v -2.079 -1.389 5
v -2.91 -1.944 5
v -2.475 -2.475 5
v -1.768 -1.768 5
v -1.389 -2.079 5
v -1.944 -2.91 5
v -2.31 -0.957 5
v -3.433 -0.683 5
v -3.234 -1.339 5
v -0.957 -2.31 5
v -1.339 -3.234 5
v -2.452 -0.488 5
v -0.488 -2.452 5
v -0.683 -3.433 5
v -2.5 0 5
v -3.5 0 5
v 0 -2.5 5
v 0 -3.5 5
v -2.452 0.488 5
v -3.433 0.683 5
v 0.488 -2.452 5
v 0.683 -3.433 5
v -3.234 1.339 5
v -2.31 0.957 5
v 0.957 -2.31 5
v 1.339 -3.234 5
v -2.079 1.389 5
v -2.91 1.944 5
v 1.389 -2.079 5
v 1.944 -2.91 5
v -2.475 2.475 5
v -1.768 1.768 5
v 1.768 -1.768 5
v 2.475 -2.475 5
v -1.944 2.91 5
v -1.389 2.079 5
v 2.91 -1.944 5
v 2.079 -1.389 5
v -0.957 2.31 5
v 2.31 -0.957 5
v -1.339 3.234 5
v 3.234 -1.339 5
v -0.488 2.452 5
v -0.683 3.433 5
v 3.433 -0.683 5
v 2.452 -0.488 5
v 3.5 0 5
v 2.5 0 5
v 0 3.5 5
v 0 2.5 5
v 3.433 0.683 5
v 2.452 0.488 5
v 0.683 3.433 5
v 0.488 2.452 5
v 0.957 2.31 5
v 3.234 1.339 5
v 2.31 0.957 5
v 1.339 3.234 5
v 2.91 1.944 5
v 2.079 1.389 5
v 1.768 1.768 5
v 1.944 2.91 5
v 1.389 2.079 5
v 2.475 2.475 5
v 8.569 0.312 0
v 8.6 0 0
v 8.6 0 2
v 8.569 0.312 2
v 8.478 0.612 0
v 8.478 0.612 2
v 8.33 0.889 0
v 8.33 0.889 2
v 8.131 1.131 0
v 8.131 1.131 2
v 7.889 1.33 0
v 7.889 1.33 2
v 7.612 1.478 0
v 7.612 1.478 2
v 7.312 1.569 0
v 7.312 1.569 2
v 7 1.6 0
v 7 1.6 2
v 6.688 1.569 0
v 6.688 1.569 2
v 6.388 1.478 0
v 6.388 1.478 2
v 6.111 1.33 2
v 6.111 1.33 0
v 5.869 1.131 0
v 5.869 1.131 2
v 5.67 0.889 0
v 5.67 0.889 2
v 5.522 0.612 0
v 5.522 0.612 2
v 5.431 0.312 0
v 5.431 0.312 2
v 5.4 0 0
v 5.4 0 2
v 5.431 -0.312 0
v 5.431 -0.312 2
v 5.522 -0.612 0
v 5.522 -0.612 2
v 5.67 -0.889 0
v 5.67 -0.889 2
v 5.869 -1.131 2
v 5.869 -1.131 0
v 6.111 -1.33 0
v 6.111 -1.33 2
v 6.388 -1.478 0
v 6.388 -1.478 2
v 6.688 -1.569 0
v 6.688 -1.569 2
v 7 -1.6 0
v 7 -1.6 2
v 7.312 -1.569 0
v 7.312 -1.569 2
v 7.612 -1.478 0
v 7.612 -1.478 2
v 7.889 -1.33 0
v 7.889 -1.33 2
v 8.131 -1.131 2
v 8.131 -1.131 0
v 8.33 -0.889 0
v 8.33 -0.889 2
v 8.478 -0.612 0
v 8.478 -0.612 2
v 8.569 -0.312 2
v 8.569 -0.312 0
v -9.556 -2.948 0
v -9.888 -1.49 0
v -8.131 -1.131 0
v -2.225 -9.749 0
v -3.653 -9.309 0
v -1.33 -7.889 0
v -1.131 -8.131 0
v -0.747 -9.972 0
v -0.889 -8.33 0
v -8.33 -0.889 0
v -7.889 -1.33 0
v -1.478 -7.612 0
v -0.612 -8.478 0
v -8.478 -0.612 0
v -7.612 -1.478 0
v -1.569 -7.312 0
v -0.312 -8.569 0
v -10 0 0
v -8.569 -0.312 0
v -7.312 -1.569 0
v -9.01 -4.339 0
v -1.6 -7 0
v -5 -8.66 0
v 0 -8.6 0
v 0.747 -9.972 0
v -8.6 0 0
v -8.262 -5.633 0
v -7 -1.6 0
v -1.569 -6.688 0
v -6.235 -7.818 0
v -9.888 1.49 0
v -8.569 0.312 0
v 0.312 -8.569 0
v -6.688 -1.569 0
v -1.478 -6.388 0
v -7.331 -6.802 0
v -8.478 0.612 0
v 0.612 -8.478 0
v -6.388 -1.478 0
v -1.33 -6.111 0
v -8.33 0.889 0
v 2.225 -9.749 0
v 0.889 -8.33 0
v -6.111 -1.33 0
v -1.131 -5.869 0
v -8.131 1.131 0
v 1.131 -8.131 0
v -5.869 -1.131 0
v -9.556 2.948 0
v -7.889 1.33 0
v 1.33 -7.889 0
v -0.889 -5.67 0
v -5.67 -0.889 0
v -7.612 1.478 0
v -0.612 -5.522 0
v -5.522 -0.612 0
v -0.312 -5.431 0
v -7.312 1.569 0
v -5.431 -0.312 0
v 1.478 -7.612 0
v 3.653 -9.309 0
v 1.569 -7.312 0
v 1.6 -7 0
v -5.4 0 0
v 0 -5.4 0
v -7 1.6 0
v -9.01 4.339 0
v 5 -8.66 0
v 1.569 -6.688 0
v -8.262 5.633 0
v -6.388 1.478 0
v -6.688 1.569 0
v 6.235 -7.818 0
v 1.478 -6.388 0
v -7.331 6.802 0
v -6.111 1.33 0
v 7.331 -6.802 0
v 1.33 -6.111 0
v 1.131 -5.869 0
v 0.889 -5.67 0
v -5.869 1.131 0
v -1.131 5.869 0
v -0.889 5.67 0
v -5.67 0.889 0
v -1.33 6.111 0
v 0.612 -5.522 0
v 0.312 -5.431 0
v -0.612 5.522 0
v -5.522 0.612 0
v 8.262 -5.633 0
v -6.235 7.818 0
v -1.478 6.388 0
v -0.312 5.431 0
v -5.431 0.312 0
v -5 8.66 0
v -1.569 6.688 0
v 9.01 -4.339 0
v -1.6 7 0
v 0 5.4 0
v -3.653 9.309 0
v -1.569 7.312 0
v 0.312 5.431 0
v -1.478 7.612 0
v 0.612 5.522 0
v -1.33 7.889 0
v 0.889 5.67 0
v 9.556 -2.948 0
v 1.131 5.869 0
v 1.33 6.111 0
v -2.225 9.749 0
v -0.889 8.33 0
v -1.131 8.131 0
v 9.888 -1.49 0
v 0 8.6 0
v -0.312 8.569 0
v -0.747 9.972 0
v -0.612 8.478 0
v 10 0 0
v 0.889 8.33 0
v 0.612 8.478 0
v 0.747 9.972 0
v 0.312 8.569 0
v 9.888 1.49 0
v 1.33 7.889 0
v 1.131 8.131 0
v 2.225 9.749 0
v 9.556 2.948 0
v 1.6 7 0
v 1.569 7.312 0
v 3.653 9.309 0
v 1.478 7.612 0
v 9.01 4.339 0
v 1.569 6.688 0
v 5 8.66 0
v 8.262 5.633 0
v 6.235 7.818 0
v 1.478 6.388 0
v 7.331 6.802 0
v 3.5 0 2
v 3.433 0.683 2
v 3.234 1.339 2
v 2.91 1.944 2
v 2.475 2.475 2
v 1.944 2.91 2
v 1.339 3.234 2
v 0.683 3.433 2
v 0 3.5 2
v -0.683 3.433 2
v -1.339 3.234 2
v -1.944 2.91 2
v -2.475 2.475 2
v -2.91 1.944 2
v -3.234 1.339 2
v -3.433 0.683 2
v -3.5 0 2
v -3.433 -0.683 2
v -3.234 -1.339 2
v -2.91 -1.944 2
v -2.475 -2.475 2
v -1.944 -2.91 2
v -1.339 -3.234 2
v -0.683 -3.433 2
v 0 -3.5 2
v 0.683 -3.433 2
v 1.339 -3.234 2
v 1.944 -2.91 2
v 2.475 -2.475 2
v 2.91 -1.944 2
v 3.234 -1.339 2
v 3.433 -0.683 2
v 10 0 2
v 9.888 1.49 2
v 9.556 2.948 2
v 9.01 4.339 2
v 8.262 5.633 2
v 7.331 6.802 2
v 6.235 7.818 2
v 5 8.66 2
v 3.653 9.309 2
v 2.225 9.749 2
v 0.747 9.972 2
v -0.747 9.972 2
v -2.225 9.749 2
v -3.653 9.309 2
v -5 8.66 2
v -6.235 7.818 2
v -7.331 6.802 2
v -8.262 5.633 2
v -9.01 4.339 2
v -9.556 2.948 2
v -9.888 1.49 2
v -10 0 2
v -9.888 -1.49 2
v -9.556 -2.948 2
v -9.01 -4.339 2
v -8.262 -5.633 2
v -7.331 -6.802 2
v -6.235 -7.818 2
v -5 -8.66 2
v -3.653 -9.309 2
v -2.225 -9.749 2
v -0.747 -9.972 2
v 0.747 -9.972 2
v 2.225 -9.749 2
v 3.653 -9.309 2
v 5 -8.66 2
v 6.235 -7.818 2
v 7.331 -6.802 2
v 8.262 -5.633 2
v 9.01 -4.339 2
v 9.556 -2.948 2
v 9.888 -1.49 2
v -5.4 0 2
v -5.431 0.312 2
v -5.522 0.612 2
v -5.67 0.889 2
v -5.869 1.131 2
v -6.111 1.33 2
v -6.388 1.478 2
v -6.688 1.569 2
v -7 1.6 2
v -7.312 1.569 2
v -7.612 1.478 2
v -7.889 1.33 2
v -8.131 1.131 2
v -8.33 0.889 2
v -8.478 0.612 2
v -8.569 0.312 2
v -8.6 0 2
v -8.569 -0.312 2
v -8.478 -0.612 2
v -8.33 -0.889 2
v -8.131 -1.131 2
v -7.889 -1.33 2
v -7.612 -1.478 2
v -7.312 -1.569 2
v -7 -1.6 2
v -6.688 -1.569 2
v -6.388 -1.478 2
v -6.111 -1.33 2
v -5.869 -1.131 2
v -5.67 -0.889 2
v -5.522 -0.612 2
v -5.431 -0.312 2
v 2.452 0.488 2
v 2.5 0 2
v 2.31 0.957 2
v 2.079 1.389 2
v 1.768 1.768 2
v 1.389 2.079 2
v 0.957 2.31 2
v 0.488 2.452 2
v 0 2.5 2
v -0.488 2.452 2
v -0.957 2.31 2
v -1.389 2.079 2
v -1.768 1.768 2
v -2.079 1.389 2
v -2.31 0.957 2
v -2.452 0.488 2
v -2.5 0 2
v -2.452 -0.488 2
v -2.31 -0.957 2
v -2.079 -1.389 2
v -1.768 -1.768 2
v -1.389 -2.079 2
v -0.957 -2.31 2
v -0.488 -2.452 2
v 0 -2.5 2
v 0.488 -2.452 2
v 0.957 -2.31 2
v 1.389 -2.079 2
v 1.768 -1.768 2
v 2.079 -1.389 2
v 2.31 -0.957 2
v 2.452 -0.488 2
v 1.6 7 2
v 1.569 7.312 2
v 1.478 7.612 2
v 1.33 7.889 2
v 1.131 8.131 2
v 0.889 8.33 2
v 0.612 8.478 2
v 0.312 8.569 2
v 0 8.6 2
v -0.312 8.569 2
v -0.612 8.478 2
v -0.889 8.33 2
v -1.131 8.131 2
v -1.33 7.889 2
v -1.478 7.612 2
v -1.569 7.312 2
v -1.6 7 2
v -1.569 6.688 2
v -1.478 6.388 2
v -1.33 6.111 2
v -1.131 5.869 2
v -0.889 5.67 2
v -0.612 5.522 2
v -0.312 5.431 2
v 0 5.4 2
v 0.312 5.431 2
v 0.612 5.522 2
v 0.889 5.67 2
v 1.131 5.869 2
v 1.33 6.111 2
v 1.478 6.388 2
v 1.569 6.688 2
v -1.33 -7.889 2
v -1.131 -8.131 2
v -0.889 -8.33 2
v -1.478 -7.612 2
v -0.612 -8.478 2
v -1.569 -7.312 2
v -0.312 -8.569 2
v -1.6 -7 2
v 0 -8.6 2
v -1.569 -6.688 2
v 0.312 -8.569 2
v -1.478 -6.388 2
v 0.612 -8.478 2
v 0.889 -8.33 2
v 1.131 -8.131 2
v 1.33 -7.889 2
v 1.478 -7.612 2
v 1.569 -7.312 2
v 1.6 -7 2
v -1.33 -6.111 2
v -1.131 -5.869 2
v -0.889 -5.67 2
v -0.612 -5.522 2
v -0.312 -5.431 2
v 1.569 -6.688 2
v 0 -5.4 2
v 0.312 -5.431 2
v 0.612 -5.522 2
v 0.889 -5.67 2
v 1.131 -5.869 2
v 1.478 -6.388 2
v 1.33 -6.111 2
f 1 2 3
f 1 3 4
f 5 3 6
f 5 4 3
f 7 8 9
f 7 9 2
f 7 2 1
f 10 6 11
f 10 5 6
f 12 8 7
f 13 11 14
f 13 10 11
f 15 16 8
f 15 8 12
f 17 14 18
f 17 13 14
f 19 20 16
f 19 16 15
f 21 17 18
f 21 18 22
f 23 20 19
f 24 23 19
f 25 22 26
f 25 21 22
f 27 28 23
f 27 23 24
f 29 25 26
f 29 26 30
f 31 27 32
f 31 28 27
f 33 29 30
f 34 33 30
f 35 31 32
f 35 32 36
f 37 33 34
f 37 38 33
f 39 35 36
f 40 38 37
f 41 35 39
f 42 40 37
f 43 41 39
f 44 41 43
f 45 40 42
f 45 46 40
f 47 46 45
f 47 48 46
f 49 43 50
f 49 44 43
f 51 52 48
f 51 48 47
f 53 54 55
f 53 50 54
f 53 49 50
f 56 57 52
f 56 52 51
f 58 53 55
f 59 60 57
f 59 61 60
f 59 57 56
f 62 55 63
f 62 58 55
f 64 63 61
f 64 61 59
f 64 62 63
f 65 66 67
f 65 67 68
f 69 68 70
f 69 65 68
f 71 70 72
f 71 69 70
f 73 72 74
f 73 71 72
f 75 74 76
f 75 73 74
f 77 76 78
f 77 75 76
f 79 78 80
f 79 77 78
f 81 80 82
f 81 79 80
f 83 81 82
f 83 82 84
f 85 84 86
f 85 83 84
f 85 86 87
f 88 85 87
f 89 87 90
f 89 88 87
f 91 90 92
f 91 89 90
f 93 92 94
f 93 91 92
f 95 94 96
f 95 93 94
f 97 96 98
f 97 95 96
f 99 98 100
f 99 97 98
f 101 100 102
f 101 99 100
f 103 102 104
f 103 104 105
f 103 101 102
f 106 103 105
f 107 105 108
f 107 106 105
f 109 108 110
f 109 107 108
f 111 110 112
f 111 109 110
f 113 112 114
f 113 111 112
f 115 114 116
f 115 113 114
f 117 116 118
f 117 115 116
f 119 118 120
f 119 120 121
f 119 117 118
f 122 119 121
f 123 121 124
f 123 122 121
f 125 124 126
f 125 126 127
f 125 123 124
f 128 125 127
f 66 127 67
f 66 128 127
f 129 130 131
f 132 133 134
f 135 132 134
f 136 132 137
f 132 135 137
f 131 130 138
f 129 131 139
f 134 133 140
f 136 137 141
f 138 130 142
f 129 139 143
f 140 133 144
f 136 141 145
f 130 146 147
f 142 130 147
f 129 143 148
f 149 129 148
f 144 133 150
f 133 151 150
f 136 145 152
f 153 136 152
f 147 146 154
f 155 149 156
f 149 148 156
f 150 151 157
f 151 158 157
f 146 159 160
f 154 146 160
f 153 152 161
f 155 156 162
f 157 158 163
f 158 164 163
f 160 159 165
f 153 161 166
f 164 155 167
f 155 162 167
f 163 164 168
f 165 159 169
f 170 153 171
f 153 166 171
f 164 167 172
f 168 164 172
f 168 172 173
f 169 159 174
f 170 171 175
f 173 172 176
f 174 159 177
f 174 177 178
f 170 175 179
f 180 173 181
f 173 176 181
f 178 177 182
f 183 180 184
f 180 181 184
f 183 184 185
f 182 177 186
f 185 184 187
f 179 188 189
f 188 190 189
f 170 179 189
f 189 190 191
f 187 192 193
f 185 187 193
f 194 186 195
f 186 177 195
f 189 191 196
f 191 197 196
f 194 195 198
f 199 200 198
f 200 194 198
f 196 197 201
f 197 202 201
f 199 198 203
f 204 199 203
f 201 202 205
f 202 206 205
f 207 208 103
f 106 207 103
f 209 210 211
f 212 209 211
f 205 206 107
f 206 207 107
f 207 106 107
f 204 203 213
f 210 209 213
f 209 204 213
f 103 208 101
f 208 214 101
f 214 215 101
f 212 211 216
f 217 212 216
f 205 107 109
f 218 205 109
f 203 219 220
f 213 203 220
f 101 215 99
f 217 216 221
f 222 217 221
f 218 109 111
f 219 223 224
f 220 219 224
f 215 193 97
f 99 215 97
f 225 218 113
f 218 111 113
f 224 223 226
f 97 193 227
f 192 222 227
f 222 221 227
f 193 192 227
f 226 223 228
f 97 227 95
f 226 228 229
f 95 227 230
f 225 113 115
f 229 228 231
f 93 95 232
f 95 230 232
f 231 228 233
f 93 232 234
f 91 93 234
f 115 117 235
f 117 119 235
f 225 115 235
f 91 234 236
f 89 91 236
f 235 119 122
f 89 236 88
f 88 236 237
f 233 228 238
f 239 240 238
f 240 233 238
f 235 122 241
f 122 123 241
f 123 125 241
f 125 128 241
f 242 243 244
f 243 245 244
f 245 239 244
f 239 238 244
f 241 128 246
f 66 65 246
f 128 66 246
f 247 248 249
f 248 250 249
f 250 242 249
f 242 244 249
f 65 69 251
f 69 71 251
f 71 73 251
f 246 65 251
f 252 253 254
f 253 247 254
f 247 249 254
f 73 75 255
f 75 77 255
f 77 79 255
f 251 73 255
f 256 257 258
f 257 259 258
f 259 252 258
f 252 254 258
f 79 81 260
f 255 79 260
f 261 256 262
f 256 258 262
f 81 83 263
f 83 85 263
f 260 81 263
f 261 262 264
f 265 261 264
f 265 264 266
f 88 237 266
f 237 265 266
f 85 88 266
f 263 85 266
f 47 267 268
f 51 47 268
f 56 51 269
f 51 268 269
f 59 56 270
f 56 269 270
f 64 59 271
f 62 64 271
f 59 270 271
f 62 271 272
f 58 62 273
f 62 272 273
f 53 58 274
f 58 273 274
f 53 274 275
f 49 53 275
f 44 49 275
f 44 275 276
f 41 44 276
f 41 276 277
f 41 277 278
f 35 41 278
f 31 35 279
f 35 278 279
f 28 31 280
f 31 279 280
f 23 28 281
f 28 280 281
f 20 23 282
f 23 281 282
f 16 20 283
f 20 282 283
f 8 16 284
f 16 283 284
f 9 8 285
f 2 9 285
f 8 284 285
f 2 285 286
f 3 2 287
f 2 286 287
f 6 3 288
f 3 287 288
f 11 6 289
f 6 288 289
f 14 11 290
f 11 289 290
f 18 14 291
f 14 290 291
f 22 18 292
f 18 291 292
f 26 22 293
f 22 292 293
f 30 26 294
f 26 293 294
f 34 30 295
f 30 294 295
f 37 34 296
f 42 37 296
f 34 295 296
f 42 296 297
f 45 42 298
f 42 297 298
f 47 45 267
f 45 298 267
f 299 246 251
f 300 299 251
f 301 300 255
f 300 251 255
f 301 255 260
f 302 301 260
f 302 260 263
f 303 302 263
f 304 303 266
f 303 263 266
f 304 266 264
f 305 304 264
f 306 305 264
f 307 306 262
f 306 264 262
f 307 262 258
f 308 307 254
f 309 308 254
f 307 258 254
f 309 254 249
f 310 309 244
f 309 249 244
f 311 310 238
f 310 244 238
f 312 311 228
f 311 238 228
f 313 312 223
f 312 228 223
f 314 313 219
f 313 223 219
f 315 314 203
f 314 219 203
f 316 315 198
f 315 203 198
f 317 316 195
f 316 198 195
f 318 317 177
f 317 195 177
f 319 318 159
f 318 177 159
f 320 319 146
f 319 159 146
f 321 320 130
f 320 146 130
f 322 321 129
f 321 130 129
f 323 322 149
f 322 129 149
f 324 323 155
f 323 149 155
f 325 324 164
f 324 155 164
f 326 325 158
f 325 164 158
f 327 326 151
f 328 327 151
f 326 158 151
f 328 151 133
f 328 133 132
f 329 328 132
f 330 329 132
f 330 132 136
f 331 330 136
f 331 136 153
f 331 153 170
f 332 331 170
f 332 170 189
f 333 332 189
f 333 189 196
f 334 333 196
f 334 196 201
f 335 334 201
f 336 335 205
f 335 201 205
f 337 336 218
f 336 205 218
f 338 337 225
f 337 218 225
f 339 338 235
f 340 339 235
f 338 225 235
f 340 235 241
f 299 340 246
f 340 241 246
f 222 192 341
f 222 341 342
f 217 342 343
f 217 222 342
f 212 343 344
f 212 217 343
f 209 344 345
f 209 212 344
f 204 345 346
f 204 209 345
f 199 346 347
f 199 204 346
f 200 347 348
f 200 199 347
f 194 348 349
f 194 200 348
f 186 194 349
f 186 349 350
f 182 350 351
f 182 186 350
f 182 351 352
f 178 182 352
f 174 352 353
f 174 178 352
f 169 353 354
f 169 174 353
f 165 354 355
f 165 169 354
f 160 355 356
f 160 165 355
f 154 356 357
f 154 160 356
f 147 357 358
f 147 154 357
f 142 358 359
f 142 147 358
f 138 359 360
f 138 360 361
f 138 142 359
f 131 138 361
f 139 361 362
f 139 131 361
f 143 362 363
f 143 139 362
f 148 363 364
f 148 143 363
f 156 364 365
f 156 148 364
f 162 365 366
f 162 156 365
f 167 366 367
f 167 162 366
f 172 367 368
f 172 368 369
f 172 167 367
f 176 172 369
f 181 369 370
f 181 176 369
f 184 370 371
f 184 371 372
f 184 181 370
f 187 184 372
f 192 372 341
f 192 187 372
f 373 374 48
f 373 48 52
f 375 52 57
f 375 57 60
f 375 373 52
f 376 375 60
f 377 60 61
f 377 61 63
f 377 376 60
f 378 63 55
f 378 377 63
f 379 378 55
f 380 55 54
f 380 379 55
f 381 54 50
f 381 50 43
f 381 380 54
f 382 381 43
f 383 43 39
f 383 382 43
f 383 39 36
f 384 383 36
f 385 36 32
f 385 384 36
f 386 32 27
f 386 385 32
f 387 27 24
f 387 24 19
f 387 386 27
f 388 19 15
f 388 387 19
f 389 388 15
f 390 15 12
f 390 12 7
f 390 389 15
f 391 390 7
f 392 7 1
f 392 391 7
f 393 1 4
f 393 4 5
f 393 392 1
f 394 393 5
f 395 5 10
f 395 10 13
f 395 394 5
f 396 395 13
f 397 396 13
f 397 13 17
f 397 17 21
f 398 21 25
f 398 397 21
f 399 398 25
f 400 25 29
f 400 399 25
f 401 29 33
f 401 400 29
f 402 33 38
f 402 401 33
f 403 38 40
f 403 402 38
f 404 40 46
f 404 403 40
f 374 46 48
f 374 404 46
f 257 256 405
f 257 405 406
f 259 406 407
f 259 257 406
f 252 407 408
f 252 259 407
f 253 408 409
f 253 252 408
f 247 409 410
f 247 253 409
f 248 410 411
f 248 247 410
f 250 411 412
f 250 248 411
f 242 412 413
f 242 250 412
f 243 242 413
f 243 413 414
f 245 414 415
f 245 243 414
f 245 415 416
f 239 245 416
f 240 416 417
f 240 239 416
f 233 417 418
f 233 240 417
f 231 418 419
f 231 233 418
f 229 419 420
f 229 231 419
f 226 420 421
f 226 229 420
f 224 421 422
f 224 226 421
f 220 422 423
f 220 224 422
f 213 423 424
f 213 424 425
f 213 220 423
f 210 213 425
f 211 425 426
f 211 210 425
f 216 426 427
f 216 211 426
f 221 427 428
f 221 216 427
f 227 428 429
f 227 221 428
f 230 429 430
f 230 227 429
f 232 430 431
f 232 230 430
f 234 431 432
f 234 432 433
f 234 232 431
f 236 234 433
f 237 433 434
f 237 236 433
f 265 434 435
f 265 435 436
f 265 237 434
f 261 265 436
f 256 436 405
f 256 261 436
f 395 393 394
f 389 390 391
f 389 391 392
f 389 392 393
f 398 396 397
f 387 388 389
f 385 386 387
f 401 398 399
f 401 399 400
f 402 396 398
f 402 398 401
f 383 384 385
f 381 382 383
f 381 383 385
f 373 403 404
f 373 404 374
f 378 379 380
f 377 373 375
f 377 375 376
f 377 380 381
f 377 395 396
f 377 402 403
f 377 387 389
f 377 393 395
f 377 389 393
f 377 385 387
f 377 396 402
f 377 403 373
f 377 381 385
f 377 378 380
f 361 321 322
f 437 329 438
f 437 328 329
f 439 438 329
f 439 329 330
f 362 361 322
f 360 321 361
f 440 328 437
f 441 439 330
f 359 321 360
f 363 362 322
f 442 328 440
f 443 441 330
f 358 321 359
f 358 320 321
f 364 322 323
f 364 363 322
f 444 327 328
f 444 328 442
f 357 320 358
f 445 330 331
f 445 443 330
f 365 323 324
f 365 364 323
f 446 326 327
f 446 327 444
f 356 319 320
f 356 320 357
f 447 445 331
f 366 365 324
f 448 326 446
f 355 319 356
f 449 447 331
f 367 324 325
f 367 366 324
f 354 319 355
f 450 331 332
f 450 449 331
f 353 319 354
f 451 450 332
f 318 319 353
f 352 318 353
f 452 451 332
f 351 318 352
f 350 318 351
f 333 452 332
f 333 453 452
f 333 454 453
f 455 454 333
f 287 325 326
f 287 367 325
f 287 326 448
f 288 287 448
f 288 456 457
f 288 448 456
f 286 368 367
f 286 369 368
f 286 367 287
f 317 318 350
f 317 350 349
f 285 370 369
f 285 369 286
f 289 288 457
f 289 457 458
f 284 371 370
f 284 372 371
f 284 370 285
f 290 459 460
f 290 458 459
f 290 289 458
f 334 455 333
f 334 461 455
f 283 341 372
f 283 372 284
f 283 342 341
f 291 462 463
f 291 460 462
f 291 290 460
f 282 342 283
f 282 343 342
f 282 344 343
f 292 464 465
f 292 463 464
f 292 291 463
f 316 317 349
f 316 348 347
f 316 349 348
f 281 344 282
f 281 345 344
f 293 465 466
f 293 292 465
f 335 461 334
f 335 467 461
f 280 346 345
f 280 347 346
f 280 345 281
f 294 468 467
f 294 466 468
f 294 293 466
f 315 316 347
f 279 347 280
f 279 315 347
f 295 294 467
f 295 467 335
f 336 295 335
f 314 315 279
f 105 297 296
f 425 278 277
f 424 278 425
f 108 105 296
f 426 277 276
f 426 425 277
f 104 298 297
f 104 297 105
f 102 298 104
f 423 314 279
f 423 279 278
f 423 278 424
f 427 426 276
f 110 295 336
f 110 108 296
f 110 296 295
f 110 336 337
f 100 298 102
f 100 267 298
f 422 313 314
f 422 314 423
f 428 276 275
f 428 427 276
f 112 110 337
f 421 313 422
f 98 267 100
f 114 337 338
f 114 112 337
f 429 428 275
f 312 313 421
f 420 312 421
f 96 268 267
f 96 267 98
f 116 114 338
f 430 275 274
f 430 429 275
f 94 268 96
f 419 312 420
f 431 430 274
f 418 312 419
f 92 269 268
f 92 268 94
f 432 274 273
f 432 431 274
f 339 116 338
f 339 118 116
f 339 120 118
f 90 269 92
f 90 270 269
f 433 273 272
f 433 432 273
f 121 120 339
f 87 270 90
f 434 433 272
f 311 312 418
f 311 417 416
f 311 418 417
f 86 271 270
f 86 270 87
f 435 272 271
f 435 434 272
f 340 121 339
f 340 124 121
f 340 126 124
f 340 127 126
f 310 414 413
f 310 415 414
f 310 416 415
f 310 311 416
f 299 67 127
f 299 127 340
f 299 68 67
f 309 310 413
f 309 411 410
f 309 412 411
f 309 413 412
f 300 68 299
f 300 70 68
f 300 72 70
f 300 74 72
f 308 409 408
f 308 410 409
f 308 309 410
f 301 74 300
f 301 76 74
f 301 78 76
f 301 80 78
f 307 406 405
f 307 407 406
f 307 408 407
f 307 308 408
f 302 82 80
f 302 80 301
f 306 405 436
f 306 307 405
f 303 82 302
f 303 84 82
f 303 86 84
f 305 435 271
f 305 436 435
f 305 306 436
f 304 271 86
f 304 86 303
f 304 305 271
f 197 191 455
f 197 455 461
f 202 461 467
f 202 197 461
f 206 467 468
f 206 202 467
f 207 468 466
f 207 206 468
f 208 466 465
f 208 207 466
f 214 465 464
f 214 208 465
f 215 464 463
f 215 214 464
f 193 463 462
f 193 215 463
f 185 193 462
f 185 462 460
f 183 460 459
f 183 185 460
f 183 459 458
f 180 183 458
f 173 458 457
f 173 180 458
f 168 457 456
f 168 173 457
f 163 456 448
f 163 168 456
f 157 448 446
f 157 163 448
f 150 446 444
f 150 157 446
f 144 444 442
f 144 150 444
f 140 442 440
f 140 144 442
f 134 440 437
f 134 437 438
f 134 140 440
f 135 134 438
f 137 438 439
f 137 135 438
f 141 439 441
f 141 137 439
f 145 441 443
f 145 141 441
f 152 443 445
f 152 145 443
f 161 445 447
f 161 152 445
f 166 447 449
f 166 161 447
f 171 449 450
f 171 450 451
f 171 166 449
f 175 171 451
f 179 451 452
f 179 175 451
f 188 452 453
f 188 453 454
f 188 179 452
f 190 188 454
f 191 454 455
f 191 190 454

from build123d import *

# Parameters (mm, degrees)
SKETCH_1_R      = 10
SKETCH_1_R_2    = 1.6
EXTRUDE_1_DEPTH = 2
SKETCH_2_R      = 3.5
SKETCH_2_R_2    = 2.5
EXTRUDE_2_DEPTH = 3


with BuildPart() as part:
    # ｽｹｯﾁ1 → ﾎﾞｽ - 押し出し1 (new body)
    with BuildSketch(Plane.XY):
        Circle(SKETCH_1_R)
        with Locations((0, 7)):
            Circle(SKETCH_1_R_2, mode=Mode.SUBTRACT)
        with Locations((7, 0)):
            Circle(SKETCH_1_R_2, mode=Mode.SUBTRACT)
        with Locations((-7, 0)):
            Circle(SKETCH_1_R_2, mode=Mode.SUBTRACT)
        with Locations((0, -7)):
            Circle(SKETCH_1_R_2, mode=Mode.SUBTRACT)
    extrude(amount=EXTRUDE_1_DEPTH)

    # ｽｹｯﾁ2 → ﾎﾞｽ - 押し出し2 (add)
    with BuildSketch(Plane.XY.offset(2)):
        Circle(SKETCH_2_R)
        Circle(SKETCH_2_R_2, mode=Mode.SUBTRACT)
    extrude(amount=EXTRUDE_2_DEPTH)


solid = part.part
